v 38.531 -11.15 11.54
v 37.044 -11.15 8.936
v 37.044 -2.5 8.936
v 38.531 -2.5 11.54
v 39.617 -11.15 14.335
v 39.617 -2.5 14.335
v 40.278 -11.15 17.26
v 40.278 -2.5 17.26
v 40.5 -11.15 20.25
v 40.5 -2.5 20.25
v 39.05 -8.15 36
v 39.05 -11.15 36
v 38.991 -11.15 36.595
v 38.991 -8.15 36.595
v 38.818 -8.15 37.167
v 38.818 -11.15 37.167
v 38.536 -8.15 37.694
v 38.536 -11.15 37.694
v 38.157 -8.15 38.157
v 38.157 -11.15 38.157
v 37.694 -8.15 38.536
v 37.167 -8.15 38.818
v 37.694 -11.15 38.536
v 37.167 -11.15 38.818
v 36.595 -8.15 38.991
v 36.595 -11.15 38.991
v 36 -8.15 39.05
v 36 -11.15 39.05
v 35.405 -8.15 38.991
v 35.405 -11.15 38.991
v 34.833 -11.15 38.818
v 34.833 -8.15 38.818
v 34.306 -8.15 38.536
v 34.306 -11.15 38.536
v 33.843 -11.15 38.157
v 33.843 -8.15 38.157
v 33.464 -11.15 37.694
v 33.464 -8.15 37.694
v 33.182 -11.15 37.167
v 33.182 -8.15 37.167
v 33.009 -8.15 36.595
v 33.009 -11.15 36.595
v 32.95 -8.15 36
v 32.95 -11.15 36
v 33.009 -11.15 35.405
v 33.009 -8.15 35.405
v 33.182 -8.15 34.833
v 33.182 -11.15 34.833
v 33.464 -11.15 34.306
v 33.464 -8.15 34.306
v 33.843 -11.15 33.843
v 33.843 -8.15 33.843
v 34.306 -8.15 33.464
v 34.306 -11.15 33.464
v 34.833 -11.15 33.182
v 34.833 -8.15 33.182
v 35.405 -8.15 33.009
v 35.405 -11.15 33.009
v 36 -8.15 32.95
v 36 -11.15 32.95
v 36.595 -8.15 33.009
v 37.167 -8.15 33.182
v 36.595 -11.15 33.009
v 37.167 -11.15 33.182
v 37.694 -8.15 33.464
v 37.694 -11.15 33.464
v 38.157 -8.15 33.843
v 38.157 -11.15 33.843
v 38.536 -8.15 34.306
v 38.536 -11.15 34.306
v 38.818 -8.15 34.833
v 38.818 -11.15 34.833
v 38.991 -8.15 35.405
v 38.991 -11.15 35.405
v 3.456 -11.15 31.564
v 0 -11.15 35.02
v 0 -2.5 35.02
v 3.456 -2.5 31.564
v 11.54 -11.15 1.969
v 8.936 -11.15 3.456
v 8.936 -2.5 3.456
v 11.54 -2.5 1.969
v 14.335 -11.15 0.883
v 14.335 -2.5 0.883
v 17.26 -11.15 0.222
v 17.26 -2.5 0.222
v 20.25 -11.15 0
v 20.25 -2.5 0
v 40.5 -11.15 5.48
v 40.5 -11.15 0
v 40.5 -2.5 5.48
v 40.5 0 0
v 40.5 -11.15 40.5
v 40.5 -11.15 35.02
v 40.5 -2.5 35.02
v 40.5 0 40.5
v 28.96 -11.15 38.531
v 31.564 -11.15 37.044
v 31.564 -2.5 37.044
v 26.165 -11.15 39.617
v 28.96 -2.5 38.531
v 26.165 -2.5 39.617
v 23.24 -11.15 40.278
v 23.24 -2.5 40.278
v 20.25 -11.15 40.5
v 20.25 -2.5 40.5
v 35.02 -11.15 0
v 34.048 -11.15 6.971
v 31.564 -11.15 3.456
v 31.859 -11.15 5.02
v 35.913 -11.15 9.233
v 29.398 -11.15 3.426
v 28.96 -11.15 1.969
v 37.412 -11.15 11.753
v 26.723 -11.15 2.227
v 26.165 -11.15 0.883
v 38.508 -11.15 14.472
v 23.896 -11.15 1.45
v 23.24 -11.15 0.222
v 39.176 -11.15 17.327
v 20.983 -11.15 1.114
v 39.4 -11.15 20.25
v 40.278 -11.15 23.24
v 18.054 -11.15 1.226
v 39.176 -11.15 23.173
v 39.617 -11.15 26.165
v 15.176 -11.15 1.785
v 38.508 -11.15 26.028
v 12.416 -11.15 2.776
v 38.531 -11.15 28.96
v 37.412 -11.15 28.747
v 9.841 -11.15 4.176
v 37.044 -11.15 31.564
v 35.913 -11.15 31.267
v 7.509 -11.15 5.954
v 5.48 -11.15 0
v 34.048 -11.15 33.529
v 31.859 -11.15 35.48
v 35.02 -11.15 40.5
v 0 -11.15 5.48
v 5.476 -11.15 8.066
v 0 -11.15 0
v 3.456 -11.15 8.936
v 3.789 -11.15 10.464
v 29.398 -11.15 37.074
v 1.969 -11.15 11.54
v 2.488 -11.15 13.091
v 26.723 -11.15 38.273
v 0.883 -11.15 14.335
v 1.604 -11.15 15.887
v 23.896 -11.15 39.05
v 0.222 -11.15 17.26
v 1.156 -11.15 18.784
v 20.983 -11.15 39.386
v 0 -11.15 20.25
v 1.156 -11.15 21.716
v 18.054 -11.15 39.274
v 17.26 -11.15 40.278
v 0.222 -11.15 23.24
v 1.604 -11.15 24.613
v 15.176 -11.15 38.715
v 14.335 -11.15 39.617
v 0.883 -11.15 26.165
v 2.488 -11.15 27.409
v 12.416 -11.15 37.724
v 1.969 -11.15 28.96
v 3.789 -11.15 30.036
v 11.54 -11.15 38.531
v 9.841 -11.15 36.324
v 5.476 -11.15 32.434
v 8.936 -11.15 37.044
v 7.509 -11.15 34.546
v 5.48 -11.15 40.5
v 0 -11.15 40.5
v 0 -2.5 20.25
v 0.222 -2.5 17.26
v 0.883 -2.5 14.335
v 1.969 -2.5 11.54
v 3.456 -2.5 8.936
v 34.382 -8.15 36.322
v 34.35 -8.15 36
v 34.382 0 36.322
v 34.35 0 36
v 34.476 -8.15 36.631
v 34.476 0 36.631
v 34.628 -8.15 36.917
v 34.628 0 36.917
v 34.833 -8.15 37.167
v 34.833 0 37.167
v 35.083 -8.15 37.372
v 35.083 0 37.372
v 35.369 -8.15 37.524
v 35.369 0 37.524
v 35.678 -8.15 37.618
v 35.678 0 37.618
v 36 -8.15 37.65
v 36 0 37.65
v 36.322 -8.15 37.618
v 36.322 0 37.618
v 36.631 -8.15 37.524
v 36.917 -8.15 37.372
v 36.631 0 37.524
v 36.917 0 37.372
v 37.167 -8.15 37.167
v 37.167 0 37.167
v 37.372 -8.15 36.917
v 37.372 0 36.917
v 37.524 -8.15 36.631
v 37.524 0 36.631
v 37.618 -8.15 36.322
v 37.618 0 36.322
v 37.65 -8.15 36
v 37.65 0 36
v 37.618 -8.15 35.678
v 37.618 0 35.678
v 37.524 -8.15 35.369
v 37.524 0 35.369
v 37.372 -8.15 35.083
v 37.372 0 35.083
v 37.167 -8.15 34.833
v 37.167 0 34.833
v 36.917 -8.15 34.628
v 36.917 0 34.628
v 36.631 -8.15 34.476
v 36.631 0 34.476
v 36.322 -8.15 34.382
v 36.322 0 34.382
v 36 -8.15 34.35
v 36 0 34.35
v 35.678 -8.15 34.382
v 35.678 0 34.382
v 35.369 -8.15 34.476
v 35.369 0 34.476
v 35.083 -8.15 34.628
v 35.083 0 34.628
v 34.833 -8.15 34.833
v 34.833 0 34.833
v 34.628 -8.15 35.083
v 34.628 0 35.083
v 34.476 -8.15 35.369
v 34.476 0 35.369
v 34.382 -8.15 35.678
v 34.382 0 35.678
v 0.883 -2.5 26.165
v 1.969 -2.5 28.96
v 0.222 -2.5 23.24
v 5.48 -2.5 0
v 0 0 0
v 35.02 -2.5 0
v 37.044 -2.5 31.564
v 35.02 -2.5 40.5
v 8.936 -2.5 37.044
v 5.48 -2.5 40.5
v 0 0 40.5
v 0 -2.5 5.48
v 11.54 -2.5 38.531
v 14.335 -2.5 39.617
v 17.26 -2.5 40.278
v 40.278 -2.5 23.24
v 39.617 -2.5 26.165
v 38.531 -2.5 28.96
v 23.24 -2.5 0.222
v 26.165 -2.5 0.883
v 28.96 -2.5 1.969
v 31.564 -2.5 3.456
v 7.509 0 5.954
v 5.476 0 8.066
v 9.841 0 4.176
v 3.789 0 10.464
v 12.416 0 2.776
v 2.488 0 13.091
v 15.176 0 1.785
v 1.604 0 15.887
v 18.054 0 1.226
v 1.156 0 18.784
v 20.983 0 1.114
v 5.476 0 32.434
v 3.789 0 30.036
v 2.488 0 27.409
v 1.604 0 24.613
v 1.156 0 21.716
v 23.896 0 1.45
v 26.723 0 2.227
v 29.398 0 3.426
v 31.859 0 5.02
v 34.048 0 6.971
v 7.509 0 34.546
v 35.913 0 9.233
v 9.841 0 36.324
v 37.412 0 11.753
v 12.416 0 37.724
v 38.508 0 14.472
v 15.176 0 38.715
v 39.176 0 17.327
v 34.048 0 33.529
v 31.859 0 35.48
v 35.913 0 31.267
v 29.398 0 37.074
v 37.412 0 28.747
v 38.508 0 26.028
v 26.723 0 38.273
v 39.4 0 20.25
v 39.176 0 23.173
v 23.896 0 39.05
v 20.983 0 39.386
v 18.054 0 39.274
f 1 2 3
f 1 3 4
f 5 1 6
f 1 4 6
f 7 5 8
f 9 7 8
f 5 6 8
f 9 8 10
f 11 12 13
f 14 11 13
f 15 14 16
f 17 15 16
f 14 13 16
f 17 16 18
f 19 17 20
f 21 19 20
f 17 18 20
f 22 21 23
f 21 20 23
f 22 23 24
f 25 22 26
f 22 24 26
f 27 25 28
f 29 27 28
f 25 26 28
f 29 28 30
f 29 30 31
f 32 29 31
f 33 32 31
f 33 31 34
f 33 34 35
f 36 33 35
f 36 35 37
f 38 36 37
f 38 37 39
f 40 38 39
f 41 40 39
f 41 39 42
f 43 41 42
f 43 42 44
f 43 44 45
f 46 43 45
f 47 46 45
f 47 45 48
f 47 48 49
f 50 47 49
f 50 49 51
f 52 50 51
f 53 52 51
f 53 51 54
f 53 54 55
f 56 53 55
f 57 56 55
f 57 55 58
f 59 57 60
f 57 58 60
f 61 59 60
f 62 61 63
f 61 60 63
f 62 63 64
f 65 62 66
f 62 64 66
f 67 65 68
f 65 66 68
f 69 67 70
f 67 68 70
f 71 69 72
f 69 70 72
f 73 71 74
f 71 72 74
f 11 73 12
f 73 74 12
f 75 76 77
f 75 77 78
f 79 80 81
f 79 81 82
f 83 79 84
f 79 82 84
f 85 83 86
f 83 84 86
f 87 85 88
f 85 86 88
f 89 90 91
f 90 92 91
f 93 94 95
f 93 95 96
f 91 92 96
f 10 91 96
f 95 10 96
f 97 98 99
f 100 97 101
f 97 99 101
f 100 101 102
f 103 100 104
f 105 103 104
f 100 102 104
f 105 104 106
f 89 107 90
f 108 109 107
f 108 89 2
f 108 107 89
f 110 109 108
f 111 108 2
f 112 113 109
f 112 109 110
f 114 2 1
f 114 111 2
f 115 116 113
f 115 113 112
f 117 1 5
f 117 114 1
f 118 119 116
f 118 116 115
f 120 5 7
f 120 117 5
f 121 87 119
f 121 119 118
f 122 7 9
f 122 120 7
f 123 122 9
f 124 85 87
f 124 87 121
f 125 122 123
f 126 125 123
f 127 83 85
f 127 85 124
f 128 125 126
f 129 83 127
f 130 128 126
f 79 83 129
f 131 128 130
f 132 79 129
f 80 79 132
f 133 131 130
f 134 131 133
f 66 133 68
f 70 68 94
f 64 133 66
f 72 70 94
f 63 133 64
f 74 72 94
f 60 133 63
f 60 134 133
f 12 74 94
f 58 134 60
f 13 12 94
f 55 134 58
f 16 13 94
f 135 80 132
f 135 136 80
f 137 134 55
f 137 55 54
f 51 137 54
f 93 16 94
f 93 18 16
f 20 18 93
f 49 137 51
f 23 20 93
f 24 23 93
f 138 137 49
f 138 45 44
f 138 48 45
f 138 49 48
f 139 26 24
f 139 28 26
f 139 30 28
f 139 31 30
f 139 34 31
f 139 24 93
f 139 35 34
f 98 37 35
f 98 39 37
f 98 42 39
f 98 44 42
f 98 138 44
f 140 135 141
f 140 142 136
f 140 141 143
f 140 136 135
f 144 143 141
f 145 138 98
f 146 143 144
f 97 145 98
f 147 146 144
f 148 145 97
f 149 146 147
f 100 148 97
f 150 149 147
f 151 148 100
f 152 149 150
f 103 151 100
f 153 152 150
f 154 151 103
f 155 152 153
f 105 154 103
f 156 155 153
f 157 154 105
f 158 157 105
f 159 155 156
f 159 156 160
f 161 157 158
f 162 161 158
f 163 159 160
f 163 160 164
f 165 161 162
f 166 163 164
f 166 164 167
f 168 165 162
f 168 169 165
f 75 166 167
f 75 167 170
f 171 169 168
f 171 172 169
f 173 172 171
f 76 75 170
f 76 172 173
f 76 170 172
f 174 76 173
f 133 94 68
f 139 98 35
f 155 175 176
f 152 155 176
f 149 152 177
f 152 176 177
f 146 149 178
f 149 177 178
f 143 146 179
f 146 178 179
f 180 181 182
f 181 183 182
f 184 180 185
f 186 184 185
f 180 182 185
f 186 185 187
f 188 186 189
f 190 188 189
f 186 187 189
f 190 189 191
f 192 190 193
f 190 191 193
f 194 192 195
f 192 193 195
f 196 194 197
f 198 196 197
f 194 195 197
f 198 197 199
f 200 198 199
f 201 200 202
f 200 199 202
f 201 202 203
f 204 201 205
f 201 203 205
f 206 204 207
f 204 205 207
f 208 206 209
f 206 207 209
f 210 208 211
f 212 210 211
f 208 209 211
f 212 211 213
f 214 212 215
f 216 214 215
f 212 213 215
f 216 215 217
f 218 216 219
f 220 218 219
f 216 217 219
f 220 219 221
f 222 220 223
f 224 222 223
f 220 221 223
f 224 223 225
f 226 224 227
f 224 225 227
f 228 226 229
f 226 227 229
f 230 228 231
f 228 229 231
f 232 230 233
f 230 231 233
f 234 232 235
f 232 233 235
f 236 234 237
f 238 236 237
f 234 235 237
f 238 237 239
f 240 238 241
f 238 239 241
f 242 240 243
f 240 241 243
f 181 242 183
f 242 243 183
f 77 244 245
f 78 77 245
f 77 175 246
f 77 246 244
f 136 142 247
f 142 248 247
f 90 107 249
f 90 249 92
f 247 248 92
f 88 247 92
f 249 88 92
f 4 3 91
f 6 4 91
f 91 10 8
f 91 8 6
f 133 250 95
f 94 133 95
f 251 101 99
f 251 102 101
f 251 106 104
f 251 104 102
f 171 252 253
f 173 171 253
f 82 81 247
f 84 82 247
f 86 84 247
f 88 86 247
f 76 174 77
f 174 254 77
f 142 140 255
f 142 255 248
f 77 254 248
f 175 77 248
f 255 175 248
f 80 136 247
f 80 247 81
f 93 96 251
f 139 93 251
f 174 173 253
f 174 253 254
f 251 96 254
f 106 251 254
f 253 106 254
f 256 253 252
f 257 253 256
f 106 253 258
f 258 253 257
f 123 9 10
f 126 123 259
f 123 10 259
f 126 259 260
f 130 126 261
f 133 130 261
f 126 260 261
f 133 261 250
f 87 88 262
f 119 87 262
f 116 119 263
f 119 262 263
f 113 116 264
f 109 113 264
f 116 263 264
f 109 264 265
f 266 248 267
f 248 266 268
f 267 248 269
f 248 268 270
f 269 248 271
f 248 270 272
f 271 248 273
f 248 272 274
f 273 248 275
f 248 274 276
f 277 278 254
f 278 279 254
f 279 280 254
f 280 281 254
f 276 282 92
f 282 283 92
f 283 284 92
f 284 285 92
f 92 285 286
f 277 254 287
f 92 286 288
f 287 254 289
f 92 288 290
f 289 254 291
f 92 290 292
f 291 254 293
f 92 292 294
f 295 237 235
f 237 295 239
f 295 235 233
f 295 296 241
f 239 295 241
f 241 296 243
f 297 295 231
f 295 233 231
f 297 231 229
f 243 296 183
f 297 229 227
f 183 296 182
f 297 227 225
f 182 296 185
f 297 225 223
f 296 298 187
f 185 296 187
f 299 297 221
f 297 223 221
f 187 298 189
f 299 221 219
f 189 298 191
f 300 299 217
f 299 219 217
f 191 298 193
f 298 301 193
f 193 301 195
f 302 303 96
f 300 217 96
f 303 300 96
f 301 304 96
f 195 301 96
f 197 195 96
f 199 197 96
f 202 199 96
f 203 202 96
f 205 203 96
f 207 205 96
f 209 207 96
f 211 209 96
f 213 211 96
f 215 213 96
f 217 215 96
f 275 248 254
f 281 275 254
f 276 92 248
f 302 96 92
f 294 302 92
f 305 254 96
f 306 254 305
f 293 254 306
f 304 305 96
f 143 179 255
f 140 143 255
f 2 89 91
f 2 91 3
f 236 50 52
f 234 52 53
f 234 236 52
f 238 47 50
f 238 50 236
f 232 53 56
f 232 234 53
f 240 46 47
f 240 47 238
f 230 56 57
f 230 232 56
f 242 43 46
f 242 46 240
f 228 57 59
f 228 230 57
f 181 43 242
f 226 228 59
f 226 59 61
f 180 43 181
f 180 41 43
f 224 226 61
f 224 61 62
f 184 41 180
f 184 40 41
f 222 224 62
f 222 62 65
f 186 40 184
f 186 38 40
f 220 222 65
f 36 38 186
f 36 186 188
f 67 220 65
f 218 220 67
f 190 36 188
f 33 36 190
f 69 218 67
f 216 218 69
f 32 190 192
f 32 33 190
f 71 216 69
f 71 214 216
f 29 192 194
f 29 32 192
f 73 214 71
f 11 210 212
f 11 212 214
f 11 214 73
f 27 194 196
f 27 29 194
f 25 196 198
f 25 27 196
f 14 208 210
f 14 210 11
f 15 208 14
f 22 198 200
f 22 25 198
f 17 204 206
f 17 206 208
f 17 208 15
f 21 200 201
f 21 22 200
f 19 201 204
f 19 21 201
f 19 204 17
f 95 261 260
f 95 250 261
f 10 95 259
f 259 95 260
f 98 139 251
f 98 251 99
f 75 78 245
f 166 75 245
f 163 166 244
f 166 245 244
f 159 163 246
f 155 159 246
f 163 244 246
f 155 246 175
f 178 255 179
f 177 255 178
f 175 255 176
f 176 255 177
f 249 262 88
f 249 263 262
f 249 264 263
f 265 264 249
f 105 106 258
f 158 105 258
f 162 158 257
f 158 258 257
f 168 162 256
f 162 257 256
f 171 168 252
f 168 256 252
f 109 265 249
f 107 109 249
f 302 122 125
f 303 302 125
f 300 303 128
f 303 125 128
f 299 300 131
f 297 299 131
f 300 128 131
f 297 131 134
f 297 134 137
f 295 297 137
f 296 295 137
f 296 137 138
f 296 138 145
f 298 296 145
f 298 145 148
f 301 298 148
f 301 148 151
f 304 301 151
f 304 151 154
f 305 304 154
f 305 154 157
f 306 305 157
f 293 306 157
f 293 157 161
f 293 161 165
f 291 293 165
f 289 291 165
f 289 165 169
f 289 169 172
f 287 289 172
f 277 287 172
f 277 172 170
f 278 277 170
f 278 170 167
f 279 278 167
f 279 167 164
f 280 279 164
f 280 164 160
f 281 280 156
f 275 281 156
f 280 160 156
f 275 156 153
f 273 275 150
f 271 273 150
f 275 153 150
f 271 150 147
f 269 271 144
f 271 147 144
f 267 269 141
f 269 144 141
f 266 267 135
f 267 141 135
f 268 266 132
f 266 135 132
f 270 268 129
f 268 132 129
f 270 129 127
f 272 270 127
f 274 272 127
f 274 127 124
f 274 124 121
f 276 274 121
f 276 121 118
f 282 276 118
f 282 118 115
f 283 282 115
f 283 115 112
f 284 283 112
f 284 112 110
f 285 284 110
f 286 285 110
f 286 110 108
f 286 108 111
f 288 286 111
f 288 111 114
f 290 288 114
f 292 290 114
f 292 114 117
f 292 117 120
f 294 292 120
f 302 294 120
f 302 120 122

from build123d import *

# Parameters (mm, degrees)
F0_W            = 40.5
F0_H            = 40.5
F1_DEPTH        = 2.5
F3_DEPTH        = 8.65
F4_DEPTH        = 8.65
F4_COPIES_COUNT = 4
F5_R            = 19.15
F6_DEPTH        = 11.151
F8_D            = 3.3
F8_CBORE_D      = 6.1
F8_CBORE_DEPTH  = 3


# Not quite as in the source:
# - a pattern or mirror of a feature is missing from the dataset's text; its kind, count and spacing are read off the source's solid


with BuildPart() as f1:
    # F0 (on Front) → F1 (new body)
    with BuildSketch(Plane.XZ):
        with Locations((20.25, 20.25)):
            Rectangle(F0_W, F0_H)
    extrude(amount=F1_DEPTH)

    # F2 (on face) → F3 (join)
    with BuildSketch(Plane.XZ.offset(2.5)):
        with BuildLine():
            ThreePointArc((20.25, 0), (34.568912319, 5.931087681), (40.5, 20.25))
            ThreePointArc((40.5, 20.25), (39.6168263322, 26.1651109727), (37.0443419437, 31.5642643895))
            ThreePointArc((37.0443419437, 31.5642643895), (34.568912319, 34.568912319), (31.5642643895, 37.0443419437))
            ThreePointArc((31.5642643895, 37.0443419437), (26.1651109727, 39.6168263322), (20.25, 40.5))
            ThreePointArc((20.25, 40.5), (5.931087681, 34.568912319), (0, 20.25))
            ThreePointArc((0, 20.25), (5.931087681, 5.931087681), (20.25, 0))
        make_face()
    extrude(amount=F3_DEPTH)

    # F2 (on face) → F4 (join, through all)
    with BuildSketch(Plane.XZ.offset(2.5)):
        with BuildLine():
            ThreePointArc((31.5642643895, 37.0443419437), (34.568912319, 34.568912319), (37.0443419437, 31.5642643895))
            Line((37.0443419437, 31.5642643895), (40.5, 35.0199224458))
            Line((40.5, 35.0199224458), (40.5, 40.5))
            Line((40.5, 40.5), (35.0199224458, 40.5))
            Line((35.0199224458, 40.5), (31.5642643895, 37.0443419437))
        make_face()
    f4 = extrude(amount=F4_DEPTH)

    # F4_copies: F4 ×4 about axis
    f4_copies_axis = Axis((20.25, 0, 20.25), (0, 1, 0))
    for i in range(1, F4_COPIES_COUNT):
        add(f4.rotate(f4_copies_axis, i * 360 / F4_COPIES_COUNT))

    # F5 (on face) → F6 (cut, through all)
    with BuildSketch(Plane.XZ.offset(11.15)):
        with Locations((20.25, 20.25)):
            Circle(F5_R)
    extrude(amount=-F6_DEPTH, mode=Mode.SUBTRACT)

    # F8 (through all)
    with Locations(Plane.XZ.offset(11.15)):
        with Locations((36, 36)):
            CounterBoreHole(F8_D / 2, F8_CBORE_D / 2, F8_CBORE_DEPTH)


solid = f1.part
